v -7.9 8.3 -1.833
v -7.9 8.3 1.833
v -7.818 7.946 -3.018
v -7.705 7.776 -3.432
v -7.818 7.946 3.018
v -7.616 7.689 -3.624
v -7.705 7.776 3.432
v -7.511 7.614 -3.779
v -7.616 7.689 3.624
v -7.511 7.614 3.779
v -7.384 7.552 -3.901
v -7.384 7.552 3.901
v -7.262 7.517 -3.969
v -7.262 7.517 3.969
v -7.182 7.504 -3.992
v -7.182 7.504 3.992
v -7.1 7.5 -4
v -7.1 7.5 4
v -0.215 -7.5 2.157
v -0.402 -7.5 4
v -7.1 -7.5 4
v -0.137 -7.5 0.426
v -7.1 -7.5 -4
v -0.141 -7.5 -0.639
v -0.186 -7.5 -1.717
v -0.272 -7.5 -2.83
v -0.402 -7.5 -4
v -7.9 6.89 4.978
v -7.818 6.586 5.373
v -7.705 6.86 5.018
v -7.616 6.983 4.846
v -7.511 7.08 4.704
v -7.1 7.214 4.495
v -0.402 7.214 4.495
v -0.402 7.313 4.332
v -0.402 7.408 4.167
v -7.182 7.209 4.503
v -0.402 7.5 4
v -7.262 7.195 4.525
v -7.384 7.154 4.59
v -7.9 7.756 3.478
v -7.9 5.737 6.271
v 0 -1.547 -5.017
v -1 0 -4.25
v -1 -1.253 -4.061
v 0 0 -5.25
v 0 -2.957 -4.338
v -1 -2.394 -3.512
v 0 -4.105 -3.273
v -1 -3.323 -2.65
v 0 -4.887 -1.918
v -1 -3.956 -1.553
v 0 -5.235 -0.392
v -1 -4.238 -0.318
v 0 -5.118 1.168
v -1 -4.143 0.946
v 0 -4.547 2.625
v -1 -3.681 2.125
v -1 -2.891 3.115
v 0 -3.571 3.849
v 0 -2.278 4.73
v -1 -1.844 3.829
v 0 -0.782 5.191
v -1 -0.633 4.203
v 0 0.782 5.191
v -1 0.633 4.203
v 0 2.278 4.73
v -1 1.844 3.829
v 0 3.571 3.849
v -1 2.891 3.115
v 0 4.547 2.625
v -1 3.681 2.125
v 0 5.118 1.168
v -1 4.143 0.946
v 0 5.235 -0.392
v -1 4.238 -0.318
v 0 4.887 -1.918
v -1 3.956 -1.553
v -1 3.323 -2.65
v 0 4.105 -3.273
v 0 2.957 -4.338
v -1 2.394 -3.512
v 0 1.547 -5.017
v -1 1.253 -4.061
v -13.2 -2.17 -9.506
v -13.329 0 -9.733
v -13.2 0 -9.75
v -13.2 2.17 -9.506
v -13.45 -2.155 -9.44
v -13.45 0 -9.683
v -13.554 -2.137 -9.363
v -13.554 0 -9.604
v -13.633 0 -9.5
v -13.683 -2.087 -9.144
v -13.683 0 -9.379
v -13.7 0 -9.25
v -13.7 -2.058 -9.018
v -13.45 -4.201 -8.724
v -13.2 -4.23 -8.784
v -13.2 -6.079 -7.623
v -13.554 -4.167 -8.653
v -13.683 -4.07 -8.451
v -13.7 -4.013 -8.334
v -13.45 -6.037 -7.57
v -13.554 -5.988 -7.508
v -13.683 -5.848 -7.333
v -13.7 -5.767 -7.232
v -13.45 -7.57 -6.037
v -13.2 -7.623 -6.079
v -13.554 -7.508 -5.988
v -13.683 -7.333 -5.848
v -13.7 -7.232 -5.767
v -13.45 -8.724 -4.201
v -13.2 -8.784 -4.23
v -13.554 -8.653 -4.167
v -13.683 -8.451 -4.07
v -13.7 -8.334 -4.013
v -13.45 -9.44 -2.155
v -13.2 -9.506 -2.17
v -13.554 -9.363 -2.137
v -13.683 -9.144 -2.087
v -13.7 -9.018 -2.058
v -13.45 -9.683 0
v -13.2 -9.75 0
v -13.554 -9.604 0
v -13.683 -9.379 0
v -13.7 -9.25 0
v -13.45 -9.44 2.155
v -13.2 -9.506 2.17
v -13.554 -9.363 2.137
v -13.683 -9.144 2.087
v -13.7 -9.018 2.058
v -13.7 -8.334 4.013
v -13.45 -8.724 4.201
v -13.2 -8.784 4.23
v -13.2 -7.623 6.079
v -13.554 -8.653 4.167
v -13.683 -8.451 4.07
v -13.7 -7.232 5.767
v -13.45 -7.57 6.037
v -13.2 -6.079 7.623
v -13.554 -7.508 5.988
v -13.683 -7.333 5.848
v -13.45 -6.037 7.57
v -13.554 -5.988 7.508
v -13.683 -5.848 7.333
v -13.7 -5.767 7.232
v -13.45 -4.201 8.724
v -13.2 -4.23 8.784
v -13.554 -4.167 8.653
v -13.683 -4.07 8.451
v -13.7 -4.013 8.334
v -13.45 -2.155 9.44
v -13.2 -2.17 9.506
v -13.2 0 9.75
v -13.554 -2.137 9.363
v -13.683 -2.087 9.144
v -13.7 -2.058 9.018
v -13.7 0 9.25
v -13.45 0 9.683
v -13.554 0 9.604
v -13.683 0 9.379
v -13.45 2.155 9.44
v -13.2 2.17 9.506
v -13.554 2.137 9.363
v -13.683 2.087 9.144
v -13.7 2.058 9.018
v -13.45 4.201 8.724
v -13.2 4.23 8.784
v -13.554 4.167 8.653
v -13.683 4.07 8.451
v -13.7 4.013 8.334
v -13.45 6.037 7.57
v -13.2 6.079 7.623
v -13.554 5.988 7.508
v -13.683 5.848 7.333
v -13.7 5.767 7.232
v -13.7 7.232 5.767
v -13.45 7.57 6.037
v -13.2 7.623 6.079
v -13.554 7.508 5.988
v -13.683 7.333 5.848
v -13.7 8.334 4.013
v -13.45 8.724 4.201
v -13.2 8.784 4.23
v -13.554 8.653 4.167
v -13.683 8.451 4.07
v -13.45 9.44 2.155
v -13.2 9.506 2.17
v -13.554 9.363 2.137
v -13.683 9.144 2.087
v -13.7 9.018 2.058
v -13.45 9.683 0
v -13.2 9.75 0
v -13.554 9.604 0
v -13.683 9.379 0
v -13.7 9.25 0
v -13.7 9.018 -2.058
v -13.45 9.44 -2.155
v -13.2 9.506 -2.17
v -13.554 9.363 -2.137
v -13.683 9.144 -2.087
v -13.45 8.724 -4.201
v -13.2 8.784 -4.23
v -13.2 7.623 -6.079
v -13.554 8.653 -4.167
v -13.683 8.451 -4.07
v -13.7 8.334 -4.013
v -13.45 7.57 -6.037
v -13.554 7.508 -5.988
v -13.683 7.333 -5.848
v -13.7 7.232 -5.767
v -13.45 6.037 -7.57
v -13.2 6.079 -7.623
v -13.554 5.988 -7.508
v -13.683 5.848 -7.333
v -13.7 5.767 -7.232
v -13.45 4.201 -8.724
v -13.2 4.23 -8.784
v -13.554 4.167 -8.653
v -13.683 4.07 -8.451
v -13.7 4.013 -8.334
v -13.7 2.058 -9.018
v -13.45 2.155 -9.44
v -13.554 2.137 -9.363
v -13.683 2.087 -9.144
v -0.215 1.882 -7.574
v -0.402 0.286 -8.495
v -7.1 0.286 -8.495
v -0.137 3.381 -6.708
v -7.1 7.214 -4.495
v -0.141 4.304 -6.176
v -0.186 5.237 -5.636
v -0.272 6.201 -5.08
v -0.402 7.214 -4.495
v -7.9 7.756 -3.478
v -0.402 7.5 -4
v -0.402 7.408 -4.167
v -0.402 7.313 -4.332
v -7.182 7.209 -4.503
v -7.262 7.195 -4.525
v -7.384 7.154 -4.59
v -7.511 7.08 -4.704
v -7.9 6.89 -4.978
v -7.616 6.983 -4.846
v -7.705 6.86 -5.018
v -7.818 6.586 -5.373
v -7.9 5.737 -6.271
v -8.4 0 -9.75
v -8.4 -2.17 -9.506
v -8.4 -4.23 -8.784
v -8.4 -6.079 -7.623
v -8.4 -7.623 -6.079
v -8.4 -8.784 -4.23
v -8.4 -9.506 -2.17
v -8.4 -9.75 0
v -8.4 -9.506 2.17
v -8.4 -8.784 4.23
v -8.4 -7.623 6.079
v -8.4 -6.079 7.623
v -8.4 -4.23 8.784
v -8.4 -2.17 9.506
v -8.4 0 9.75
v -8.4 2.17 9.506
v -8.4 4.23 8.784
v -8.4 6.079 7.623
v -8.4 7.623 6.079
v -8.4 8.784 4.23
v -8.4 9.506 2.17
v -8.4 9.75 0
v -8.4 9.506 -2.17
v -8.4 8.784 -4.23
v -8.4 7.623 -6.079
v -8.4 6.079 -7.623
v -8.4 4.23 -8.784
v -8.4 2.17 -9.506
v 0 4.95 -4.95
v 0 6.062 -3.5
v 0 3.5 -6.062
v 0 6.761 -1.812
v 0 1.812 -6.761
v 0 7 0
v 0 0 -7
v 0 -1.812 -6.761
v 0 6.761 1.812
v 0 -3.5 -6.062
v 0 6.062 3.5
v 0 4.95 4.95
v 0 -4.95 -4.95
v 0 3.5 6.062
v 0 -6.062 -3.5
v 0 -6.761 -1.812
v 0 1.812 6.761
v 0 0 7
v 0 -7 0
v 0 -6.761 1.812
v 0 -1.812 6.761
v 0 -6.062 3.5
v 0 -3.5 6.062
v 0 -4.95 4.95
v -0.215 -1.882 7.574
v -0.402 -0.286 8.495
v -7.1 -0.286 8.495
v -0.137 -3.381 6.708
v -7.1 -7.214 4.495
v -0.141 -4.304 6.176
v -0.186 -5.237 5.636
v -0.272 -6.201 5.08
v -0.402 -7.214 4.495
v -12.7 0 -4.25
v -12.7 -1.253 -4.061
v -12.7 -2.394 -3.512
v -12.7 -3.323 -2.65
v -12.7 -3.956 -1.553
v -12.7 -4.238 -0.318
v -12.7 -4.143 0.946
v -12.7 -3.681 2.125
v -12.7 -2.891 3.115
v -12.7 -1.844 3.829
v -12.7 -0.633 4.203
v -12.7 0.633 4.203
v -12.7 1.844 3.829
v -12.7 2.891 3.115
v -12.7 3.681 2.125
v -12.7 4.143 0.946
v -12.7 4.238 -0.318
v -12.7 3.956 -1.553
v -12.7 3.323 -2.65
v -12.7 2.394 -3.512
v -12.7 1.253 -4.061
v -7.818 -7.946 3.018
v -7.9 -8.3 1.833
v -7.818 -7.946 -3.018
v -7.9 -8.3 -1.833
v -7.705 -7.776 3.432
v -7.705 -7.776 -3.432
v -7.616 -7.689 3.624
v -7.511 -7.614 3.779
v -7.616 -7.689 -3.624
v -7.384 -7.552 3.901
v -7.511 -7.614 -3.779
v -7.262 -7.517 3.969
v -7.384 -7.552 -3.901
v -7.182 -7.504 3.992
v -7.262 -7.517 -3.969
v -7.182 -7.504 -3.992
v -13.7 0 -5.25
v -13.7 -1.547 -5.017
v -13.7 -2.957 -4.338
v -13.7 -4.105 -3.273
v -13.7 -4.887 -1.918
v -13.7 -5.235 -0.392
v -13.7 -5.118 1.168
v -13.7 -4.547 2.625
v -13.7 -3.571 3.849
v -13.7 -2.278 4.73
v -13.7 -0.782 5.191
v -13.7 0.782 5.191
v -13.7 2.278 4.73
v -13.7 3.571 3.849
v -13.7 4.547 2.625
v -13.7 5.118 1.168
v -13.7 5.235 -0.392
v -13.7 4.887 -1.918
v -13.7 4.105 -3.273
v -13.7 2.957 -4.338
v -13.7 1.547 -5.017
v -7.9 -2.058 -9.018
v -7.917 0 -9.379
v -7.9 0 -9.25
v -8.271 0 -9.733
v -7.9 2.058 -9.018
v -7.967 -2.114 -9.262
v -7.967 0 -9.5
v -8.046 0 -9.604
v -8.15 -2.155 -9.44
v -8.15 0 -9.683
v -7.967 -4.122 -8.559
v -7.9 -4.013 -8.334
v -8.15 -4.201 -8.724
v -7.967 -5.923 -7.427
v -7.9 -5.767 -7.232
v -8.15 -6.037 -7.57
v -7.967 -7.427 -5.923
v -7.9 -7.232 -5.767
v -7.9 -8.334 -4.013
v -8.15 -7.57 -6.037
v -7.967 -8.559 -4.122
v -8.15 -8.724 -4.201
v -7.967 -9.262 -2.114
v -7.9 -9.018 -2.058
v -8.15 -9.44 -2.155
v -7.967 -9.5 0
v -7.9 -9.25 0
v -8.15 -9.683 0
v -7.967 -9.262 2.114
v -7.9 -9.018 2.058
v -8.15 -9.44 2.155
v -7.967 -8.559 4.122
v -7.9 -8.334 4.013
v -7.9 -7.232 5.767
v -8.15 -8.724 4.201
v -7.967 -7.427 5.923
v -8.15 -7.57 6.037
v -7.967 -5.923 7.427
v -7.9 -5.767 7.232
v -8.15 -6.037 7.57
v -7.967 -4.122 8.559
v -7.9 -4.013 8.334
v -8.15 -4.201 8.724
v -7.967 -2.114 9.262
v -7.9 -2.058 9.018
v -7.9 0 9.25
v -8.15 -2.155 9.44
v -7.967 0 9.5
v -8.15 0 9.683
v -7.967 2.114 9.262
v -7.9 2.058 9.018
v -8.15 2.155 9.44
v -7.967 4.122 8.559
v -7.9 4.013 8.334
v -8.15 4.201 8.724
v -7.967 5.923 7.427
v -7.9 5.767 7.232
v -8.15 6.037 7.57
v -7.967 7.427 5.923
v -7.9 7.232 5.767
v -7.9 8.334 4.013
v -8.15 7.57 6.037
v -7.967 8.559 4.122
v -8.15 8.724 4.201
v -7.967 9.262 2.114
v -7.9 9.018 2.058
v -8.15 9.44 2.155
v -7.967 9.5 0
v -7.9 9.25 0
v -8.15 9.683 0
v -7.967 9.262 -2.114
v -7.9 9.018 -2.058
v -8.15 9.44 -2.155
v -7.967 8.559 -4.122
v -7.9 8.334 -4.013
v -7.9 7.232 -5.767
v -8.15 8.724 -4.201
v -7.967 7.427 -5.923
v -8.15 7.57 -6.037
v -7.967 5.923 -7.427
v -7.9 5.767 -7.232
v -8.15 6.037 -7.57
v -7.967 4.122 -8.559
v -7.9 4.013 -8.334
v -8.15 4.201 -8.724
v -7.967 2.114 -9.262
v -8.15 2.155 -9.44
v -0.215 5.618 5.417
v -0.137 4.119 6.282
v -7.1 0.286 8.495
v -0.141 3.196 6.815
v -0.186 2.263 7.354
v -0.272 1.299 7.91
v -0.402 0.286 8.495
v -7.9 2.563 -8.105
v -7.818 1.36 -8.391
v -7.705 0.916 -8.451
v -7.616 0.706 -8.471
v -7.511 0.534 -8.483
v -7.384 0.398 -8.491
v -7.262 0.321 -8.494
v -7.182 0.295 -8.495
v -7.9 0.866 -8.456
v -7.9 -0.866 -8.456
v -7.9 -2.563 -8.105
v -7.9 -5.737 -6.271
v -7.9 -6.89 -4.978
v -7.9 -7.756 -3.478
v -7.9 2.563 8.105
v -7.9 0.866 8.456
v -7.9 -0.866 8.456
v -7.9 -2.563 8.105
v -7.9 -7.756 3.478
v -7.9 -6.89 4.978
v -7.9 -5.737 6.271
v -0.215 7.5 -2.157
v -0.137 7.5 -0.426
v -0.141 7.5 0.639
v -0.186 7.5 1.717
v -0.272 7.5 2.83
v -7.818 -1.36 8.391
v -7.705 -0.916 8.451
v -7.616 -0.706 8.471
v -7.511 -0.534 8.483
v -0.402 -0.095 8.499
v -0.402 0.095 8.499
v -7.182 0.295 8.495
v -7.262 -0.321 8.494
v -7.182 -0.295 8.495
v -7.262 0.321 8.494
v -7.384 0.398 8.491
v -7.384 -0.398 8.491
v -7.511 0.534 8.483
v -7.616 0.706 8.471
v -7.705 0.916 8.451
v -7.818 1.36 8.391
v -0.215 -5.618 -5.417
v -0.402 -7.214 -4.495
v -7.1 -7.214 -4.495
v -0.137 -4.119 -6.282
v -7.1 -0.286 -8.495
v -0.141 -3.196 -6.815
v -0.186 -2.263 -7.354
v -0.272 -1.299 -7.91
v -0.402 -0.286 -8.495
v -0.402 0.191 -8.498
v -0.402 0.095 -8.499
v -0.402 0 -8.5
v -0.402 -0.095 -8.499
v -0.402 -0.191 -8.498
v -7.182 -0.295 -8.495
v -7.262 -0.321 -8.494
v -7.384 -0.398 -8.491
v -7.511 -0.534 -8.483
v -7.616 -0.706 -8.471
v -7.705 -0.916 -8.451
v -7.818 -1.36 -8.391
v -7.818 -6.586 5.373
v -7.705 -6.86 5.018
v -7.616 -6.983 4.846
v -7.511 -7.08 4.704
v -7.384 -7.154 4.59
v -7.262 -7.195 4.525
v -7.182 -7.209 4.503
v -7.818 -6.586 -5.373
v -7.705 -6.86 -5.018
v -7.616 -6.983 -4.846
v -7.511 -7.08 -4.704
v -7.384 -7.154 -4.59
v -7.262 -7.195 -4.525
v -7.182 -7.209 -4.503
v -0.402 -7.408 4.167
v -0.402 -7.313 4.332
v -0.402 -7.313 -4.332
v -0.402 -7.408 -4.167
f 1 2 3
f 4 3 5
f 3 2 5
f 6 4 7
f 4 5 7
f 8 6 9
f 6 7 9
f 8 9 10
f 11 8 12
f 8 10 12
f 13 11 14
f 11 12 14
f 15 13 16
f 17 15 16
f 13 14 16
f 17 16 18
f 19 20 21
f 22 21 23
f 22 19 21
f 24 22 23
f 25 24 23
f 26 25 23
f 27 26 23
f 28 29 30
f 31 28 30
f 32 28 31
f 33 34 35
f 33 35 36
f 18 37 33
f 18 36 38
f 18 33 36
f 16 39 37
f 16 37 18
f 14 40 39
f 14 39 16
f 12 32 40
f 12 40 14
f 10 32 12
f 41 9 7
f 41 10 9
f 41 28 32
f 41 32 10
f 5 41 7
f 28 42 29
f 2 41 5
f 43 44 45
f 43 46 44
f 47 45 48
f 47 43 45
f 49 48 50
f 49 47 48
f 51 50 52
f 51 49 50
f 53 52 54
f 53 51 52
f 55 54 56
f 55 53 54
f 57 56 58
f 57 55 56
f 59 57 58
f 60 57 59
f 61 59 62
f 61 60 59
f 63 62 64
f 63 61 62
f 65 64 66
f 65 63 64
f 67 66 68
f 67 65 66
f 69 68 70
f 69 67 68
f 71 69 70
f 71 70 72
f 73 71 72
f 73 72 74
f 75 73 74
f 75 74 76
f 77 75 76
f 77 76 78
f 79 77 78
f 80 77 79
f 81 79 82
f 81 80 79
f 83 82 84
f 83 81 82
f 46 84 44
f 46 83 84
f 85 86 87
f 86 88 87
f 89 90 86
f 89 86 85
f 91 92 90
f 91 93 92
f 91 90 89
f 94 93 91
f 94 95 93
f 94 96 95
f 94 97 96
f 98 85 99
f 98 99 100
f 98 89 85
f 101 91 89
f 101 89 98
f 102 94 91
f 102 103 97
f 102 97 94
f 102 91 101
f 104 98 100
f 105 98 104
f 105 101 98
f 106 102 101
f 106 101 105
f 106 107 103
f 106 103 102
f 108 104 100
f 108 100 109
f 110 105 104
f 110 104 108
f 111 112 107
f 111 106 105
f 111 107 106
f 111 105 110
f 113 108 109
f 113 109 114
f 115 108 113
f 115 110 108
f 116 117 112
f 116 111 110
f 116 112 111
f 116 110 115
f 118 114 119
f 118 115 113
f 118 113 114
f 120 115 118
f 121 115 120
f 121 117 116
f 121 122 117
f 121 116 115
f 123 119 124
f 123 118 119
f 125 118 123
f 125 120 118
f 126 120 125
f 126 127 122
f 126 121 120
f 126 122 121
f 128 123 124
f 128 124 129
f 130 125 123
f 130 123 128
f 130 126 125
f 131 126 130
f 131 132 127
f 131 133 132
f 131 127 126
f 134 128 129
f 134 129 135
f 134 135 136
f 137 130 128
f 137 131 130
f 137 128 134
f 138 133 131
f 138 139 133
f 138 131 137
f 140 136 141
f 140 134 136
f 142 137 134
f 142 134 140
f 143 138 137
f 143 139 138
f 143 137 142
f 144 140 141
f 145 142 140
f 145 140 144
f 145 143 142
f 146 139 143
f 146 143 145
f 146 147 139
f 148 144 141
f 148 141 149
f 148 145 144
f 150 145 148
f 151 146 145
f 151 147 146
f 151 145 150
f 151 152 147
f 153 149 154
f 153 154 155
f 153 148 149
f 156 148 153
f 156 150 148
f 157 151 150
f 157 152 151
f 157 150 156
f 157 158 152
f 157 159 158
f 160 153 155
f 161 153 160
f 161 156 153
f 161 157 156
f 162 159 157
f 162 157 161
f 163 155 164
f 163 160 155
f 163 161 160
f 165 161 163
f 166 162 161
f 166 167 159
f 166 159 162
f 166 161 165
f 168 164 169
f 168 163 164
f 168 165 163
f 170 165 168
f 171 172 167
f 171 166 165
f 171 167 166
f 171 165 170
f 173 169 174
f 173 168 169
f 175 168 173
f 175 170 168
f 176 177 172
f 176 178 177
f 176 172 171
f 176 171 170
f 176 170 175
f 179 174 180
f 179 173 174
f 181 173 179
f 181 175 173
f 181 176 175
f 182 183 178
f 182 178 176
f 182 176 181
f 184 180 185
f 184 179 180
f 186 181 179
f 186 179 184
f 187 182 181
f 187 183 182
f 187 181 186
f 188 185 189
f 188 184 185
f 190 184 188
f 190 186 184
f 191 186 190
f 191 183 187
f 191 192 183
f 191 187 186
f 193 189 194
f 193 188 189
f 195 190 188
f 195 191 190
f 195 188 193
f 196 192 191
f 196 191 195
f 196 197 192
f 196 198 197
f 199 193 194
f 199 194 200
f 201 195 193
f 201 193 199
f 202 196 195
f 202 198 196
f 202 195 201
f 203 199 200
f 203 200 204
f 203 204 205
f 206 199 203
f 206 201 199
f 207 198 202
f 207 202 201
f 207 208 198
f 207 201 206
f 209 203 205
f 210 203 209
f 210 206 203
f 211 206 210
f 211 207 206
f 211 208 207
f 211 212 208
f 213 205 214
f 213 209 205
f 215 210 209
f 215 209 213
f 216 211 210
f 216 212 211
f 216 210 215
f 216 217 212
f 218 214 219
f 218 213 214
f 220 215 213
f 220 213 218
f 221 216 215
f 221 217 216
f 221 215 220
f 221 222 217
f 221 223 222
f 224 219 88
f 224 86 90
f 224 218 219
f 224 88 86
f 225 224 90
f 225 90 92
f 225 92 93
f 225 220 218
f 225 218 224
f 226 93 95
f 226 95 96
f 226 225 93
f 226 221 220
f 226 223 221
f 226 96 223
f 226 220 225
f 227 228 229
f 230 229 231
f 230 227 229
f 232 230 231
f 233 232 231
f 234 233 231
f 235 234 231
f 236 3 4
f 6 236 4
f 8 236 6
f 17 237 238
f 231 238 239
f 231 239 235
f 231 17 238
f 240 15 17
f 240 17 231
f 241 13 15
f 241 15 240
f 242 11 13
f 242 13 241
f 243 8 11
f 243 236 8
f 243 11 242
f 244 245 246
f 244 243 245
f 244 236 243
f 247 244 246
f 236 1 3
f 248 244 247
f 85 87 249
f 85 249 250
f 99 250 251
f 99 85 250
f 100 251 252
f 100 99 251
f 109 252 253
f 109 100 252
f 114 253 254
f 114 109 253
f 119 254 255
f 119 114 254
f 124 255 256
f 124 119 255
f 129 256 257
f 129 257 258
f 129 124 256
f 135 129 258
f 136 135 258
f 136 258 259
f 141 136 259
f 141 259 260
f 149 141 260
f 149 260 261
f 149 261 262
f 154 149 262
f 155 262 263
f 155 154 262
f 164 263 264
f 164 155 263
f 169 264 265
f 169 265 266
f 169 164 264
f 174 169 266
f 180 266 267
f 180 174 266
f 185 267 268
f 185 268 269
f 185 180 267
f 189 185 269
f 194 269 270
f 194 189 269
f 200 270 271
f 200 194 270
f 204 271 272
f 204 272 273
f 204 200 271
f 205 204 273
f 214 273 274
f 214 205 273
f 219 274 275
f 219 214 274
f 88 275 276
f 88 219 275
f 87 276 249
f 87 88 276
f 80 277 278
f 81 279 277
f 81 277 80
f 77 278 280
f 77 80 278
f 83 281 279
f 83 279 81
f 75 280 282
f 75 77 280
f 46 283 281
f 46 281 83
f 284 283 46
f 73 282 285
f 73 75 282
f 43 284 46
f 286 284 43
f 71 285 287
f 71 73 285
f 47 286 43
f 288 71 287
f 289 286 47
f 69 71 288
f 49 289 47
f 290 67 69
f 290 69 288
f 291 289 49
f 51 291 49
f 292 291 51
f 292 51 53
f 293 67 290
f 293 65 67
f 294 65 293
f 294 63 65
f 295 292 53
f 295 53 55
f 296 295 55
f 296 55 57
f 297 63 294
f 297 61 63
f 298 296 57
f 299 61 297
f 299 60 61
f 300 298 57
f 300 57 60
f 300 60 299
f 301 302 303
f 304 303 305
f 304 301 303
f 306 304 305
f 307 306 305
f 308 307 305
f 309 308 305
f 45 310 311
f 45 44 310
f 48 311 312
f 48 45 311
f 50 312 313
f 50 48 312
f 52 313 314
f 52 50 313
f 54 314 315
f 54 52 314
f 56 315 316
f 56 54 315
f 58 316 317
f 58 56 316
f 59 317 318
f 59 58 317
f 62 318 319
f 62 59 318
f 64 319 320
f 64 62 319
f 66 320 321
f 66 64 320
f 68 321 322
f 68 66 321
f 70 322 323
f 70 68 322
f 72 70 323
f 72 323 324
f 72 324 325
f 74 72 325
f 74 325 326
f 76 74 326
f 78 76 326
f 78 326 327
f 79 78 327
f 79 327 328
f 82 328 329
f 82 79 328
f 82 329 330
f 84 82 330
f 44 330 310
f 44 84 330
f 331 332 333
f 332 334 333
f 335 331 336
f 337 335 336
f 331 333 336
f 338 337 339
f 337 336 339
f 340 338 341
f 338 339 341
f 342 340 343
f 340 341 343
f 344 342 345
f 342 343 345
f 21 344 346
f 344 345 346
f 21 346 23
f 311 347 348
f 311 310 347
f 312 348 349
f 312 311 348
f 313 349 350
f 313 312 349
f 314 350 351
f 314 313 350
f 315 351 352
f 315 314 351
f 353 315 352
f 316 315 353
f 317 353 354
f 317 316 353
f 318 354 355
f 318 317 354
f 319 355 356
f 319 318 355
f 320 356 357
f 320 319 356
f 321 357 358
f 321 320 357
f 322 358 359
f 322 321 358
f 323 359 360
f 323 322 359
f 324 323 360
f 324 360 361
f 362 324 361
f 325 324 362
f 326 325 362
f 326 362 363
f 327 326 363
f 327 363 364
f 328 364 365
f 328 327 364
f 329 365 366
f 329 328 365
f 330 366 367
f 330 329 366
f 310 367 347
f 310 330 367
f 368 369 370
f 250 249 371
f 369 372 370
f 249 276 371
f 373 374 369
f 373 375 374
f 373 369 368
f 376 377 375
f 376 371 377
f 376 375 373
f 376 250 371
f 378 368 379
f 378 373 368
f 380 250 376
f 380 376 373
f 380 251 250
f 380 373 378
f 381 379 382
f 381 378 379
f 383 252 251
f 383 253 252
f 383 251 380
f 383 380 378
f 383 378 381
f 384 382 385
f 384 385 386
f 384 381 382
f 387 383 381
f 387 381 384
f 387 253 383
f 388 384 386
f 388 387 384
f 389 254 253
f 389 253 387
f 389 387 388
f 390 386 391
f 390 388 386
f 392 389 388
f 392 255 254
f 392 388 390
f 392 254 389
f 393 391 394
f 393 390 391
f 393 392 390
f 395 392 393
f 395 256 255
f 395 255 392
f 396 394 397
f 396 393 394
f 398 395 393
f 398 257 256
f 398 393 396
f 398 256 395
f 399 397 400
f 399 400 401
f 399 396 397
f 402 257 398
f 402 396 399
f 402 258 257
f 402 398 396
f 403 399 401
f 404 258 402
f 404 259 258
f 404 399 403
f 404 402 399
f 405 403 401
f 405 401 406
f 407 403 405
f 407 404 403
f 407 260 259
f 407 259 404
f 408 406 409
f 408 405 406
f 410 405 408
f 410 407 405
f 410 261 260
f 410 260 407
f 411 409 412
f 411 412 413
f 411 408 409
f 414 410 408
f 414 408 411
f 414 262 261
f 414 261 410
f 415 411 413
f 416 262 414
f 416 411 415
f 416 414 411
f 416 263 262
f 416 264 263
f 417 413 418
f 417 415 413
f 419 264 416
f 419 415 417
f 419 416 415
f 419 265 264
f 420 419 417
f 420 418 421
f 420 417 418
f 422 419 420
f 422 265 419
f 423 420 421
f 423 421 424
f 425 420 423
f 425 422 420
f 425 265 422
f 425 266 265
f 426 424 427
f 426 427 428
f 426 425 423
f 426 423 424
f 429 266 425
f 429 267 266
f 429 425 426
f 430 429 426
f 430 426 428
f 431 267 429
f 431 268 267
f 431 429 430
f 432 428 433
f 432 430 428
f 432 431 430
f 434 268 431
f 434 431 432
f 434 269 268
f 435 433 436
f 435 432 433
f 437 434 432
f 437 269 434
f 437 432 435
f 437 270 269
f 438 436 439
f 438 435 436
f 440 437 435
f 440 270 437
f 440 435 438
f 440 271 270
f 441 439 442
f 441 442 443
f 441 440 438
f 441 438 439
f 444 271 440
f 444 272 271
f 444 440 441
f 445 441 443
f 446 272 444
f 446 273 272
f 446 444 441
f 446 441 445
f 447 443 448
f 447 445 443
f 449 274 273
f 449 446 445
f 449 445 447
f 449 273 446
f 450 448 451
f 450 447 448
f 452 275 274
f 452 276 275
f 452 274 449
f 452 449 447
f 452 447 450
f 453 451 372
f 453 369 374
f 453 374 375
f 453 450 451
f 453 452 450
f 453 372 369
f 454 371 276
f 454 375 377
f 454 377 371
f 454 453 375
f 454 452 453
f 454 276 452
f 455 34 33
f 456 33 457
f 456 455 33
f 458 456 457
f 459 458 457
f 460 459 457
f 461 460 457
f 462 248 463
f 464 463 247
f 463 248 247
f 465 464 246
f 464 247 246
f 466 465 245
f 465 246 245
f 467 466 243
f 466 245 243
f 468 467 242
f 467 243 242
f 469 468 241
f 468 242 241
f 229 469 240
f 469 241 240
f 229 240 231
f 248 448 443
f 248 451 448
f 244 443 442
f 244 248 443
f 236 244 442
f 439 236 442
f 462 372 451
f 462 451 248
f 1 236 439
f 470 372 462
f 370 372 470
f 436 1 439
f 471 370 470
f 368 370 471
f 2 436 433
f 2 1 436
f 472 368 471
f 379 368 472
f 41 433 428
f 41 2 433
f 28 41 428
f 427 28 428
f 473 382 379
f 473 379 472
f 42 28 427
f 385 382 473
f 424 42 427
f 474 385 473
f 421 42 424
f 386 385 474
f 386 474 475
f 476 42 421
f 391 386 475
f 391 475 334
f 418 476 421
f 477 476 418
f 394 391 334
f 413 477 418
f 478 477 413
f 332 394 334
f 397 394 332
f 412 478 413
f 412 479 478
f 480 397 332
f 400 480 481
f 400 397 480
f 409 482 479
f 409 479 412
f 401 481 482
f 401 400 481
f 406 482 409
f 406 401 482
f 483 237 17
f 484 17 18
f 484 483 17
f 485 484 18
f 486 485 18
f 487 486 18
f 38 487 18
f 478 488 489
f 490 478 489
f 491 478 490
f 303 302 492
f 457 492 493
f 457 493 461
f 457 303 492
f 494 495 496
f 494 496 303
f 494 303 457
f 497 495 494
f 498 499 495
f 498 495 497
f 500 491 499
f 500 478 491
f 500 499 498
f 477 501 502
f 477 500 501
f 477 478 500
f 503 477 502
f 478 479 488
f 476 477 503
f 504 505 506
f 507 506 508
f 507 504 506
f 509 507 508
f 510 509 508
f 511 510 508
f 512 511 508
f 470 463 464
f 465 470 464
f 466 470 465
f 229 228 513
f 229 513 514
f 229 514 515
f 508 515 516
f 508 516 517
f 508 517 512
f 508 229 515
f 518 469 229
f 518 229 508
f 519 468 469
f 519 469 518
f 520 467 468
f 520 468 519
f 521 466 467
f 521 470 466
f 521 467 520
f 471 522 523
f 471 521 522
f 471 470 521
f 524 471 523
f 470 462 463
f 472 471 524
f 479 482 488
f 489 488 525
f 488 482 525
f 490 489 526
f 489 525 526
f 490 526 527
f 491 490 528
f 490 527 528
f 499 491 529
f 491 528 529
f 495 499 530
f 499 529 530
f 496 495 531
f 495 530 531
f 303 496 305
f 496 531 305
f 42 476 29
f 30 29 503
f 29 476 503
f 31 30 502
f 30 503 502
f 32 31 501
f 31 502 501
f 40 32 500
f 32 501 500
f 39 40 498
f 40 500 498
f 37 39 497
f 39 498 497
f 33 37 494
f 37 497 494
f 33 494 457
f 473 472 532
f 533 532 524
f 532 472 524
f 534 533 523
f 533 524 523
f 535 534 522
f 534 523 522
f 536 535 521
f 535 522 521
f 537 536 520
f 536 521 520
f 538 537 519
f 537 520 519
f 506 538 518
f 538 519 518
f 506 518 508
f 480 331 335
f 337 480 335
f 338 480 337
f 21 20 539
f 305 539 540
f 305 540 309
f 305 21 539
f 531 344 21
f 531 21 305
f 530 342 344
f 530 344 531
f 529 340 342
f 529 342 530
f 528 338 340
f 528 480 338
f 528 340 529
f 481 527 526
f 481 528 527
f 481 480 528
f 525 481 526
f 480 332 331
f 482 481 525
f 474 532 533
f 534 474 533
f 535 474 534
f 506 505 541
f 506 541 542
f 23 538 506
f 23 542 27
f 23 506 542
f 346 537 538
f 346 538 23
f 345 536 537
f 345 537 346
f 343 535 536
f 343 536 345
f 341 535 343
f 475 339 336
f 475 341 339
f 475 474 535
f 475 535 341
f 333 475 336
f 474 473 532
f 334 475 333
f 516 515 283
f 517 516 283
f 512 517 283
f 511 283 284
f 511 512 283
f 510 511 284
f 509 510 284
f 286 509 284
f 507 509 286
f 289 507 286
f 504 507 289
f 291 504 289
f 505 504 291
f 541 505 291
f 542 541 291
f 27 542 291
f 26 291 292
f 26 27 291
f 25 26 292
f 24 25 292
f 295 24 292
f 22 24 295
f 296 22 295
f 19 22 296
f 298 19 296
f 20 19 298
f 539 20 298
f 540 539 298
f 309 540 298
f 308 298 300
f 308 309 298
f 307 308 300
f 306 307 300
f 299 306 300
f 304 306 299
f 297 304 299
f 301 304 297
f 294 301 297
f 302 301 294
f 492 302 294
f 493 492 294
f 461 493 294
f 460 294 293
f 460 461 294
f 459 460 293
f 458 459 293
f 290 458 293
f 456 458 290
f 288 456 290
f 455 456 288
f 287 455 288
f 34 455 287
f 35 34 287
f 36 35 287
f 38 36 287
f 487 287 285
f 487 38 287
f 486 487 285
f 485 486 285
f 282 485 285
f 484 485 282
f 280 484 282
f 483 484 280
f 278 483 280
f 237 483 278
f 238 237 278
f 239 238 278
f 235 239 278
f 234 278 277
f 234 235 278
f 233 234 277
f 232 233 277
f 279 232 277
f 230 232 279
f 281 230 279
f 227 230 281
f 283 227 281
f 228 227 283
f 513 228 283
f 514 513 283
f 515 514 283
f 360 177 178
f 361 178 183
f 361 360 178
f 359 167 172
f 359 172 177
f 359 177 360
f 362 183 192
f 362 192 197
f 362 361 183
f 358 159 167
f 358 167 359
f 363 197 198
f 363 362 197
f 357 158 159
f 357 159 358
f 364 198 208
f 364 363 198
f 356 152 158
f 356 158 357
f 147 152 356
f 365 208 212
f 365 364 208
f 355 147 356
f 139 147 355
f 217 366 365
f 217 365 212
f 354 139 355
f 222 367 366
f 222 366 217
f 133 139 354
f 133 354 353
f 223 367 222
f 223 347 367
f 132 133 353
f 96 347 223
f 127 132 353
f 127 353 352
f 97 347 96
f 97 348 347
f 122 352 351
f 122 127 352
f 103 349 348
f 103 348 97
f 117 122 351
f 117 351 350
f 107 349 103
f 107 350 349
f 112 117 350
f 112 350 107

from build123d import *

# Parameters (mm, degrees)
SKETCH2_OUTSIDE_W  = 27.658
SKETCH2_OUTSIDE_H  = 27.658
CUT_EXTRUDE1_DEPTH = 7.9
FILLET1_R          = 0.5
FILLET2_R          = 0.8


with BuildPart() as part:
    # Sketch1 → Revolve1 (revolve)
    with BuildSketch(Plane.XY, mode=Mode.PRIVATE) as revolve1_sk:
        Polygon((0, 5.25), (0, 7), (-0.401923789, 8.5), (-7.9, 8.5), (-7.9, 9.75), (-13.7, 9.75), (-13.7, 5.25), (-12.7, 4.25), (-1, 4.25), align=None)
    revolve(revolve1_sk.sketch.rotate(Axis((0, 0, 0), (-1, 0, 0)), 90), axis=Axis((0, 0, 0), (-1, 0, 0)))

    # Sketch2 outside → Cut-Extrude1 (cut)
    with BuildSketch(Plane(origin=(0, 0, 0), x_dir=(0, 0, -1), z_dir=(1, 0, 0))):
        Rectangle(SKETCH2_OUTSIDE_W, SKETCH2_OUTSIDE_H)
        Polygon((8.660254038, 0), (4.330127019, 7.5), (-4.330127019, 7.5), (-8.660254038, 0), (-4.330127019, -7.5), (4.330127019, -7.5), align=None, mode=Mode.SUBTRACT)
    extrude(amount=-CUT_EXTRUDE1_DEPTH, mode=Mode.SUBTRACT)

    # Fillet1
    fillet1_edges = [part.edges().sort_by_distance(p)[0] for p in [
        (-7.9, 0, 9.75),
        (-13.7, 0, 9.75),
    ]]
    fillet(fillet1_edges, radius=FILLET1_R)

    # Fillet2
    fillet2_edges = [part.edges().sort_by_distance(p)[0] for p in [
        (-7.9, 3.75, -6.495190528),
        (-7.9, 7.5, 0),
        (-7.9, 3.75, 6.495190528),
        (-7.9, -3.75, 6.495190528),
        (-7.9, -7.5, 0),
        (-7.9, -3.75, -6.495190528),
    ]]
    fillet(fillet2_edges, radius=FILLET2_R)


solid = part.part
